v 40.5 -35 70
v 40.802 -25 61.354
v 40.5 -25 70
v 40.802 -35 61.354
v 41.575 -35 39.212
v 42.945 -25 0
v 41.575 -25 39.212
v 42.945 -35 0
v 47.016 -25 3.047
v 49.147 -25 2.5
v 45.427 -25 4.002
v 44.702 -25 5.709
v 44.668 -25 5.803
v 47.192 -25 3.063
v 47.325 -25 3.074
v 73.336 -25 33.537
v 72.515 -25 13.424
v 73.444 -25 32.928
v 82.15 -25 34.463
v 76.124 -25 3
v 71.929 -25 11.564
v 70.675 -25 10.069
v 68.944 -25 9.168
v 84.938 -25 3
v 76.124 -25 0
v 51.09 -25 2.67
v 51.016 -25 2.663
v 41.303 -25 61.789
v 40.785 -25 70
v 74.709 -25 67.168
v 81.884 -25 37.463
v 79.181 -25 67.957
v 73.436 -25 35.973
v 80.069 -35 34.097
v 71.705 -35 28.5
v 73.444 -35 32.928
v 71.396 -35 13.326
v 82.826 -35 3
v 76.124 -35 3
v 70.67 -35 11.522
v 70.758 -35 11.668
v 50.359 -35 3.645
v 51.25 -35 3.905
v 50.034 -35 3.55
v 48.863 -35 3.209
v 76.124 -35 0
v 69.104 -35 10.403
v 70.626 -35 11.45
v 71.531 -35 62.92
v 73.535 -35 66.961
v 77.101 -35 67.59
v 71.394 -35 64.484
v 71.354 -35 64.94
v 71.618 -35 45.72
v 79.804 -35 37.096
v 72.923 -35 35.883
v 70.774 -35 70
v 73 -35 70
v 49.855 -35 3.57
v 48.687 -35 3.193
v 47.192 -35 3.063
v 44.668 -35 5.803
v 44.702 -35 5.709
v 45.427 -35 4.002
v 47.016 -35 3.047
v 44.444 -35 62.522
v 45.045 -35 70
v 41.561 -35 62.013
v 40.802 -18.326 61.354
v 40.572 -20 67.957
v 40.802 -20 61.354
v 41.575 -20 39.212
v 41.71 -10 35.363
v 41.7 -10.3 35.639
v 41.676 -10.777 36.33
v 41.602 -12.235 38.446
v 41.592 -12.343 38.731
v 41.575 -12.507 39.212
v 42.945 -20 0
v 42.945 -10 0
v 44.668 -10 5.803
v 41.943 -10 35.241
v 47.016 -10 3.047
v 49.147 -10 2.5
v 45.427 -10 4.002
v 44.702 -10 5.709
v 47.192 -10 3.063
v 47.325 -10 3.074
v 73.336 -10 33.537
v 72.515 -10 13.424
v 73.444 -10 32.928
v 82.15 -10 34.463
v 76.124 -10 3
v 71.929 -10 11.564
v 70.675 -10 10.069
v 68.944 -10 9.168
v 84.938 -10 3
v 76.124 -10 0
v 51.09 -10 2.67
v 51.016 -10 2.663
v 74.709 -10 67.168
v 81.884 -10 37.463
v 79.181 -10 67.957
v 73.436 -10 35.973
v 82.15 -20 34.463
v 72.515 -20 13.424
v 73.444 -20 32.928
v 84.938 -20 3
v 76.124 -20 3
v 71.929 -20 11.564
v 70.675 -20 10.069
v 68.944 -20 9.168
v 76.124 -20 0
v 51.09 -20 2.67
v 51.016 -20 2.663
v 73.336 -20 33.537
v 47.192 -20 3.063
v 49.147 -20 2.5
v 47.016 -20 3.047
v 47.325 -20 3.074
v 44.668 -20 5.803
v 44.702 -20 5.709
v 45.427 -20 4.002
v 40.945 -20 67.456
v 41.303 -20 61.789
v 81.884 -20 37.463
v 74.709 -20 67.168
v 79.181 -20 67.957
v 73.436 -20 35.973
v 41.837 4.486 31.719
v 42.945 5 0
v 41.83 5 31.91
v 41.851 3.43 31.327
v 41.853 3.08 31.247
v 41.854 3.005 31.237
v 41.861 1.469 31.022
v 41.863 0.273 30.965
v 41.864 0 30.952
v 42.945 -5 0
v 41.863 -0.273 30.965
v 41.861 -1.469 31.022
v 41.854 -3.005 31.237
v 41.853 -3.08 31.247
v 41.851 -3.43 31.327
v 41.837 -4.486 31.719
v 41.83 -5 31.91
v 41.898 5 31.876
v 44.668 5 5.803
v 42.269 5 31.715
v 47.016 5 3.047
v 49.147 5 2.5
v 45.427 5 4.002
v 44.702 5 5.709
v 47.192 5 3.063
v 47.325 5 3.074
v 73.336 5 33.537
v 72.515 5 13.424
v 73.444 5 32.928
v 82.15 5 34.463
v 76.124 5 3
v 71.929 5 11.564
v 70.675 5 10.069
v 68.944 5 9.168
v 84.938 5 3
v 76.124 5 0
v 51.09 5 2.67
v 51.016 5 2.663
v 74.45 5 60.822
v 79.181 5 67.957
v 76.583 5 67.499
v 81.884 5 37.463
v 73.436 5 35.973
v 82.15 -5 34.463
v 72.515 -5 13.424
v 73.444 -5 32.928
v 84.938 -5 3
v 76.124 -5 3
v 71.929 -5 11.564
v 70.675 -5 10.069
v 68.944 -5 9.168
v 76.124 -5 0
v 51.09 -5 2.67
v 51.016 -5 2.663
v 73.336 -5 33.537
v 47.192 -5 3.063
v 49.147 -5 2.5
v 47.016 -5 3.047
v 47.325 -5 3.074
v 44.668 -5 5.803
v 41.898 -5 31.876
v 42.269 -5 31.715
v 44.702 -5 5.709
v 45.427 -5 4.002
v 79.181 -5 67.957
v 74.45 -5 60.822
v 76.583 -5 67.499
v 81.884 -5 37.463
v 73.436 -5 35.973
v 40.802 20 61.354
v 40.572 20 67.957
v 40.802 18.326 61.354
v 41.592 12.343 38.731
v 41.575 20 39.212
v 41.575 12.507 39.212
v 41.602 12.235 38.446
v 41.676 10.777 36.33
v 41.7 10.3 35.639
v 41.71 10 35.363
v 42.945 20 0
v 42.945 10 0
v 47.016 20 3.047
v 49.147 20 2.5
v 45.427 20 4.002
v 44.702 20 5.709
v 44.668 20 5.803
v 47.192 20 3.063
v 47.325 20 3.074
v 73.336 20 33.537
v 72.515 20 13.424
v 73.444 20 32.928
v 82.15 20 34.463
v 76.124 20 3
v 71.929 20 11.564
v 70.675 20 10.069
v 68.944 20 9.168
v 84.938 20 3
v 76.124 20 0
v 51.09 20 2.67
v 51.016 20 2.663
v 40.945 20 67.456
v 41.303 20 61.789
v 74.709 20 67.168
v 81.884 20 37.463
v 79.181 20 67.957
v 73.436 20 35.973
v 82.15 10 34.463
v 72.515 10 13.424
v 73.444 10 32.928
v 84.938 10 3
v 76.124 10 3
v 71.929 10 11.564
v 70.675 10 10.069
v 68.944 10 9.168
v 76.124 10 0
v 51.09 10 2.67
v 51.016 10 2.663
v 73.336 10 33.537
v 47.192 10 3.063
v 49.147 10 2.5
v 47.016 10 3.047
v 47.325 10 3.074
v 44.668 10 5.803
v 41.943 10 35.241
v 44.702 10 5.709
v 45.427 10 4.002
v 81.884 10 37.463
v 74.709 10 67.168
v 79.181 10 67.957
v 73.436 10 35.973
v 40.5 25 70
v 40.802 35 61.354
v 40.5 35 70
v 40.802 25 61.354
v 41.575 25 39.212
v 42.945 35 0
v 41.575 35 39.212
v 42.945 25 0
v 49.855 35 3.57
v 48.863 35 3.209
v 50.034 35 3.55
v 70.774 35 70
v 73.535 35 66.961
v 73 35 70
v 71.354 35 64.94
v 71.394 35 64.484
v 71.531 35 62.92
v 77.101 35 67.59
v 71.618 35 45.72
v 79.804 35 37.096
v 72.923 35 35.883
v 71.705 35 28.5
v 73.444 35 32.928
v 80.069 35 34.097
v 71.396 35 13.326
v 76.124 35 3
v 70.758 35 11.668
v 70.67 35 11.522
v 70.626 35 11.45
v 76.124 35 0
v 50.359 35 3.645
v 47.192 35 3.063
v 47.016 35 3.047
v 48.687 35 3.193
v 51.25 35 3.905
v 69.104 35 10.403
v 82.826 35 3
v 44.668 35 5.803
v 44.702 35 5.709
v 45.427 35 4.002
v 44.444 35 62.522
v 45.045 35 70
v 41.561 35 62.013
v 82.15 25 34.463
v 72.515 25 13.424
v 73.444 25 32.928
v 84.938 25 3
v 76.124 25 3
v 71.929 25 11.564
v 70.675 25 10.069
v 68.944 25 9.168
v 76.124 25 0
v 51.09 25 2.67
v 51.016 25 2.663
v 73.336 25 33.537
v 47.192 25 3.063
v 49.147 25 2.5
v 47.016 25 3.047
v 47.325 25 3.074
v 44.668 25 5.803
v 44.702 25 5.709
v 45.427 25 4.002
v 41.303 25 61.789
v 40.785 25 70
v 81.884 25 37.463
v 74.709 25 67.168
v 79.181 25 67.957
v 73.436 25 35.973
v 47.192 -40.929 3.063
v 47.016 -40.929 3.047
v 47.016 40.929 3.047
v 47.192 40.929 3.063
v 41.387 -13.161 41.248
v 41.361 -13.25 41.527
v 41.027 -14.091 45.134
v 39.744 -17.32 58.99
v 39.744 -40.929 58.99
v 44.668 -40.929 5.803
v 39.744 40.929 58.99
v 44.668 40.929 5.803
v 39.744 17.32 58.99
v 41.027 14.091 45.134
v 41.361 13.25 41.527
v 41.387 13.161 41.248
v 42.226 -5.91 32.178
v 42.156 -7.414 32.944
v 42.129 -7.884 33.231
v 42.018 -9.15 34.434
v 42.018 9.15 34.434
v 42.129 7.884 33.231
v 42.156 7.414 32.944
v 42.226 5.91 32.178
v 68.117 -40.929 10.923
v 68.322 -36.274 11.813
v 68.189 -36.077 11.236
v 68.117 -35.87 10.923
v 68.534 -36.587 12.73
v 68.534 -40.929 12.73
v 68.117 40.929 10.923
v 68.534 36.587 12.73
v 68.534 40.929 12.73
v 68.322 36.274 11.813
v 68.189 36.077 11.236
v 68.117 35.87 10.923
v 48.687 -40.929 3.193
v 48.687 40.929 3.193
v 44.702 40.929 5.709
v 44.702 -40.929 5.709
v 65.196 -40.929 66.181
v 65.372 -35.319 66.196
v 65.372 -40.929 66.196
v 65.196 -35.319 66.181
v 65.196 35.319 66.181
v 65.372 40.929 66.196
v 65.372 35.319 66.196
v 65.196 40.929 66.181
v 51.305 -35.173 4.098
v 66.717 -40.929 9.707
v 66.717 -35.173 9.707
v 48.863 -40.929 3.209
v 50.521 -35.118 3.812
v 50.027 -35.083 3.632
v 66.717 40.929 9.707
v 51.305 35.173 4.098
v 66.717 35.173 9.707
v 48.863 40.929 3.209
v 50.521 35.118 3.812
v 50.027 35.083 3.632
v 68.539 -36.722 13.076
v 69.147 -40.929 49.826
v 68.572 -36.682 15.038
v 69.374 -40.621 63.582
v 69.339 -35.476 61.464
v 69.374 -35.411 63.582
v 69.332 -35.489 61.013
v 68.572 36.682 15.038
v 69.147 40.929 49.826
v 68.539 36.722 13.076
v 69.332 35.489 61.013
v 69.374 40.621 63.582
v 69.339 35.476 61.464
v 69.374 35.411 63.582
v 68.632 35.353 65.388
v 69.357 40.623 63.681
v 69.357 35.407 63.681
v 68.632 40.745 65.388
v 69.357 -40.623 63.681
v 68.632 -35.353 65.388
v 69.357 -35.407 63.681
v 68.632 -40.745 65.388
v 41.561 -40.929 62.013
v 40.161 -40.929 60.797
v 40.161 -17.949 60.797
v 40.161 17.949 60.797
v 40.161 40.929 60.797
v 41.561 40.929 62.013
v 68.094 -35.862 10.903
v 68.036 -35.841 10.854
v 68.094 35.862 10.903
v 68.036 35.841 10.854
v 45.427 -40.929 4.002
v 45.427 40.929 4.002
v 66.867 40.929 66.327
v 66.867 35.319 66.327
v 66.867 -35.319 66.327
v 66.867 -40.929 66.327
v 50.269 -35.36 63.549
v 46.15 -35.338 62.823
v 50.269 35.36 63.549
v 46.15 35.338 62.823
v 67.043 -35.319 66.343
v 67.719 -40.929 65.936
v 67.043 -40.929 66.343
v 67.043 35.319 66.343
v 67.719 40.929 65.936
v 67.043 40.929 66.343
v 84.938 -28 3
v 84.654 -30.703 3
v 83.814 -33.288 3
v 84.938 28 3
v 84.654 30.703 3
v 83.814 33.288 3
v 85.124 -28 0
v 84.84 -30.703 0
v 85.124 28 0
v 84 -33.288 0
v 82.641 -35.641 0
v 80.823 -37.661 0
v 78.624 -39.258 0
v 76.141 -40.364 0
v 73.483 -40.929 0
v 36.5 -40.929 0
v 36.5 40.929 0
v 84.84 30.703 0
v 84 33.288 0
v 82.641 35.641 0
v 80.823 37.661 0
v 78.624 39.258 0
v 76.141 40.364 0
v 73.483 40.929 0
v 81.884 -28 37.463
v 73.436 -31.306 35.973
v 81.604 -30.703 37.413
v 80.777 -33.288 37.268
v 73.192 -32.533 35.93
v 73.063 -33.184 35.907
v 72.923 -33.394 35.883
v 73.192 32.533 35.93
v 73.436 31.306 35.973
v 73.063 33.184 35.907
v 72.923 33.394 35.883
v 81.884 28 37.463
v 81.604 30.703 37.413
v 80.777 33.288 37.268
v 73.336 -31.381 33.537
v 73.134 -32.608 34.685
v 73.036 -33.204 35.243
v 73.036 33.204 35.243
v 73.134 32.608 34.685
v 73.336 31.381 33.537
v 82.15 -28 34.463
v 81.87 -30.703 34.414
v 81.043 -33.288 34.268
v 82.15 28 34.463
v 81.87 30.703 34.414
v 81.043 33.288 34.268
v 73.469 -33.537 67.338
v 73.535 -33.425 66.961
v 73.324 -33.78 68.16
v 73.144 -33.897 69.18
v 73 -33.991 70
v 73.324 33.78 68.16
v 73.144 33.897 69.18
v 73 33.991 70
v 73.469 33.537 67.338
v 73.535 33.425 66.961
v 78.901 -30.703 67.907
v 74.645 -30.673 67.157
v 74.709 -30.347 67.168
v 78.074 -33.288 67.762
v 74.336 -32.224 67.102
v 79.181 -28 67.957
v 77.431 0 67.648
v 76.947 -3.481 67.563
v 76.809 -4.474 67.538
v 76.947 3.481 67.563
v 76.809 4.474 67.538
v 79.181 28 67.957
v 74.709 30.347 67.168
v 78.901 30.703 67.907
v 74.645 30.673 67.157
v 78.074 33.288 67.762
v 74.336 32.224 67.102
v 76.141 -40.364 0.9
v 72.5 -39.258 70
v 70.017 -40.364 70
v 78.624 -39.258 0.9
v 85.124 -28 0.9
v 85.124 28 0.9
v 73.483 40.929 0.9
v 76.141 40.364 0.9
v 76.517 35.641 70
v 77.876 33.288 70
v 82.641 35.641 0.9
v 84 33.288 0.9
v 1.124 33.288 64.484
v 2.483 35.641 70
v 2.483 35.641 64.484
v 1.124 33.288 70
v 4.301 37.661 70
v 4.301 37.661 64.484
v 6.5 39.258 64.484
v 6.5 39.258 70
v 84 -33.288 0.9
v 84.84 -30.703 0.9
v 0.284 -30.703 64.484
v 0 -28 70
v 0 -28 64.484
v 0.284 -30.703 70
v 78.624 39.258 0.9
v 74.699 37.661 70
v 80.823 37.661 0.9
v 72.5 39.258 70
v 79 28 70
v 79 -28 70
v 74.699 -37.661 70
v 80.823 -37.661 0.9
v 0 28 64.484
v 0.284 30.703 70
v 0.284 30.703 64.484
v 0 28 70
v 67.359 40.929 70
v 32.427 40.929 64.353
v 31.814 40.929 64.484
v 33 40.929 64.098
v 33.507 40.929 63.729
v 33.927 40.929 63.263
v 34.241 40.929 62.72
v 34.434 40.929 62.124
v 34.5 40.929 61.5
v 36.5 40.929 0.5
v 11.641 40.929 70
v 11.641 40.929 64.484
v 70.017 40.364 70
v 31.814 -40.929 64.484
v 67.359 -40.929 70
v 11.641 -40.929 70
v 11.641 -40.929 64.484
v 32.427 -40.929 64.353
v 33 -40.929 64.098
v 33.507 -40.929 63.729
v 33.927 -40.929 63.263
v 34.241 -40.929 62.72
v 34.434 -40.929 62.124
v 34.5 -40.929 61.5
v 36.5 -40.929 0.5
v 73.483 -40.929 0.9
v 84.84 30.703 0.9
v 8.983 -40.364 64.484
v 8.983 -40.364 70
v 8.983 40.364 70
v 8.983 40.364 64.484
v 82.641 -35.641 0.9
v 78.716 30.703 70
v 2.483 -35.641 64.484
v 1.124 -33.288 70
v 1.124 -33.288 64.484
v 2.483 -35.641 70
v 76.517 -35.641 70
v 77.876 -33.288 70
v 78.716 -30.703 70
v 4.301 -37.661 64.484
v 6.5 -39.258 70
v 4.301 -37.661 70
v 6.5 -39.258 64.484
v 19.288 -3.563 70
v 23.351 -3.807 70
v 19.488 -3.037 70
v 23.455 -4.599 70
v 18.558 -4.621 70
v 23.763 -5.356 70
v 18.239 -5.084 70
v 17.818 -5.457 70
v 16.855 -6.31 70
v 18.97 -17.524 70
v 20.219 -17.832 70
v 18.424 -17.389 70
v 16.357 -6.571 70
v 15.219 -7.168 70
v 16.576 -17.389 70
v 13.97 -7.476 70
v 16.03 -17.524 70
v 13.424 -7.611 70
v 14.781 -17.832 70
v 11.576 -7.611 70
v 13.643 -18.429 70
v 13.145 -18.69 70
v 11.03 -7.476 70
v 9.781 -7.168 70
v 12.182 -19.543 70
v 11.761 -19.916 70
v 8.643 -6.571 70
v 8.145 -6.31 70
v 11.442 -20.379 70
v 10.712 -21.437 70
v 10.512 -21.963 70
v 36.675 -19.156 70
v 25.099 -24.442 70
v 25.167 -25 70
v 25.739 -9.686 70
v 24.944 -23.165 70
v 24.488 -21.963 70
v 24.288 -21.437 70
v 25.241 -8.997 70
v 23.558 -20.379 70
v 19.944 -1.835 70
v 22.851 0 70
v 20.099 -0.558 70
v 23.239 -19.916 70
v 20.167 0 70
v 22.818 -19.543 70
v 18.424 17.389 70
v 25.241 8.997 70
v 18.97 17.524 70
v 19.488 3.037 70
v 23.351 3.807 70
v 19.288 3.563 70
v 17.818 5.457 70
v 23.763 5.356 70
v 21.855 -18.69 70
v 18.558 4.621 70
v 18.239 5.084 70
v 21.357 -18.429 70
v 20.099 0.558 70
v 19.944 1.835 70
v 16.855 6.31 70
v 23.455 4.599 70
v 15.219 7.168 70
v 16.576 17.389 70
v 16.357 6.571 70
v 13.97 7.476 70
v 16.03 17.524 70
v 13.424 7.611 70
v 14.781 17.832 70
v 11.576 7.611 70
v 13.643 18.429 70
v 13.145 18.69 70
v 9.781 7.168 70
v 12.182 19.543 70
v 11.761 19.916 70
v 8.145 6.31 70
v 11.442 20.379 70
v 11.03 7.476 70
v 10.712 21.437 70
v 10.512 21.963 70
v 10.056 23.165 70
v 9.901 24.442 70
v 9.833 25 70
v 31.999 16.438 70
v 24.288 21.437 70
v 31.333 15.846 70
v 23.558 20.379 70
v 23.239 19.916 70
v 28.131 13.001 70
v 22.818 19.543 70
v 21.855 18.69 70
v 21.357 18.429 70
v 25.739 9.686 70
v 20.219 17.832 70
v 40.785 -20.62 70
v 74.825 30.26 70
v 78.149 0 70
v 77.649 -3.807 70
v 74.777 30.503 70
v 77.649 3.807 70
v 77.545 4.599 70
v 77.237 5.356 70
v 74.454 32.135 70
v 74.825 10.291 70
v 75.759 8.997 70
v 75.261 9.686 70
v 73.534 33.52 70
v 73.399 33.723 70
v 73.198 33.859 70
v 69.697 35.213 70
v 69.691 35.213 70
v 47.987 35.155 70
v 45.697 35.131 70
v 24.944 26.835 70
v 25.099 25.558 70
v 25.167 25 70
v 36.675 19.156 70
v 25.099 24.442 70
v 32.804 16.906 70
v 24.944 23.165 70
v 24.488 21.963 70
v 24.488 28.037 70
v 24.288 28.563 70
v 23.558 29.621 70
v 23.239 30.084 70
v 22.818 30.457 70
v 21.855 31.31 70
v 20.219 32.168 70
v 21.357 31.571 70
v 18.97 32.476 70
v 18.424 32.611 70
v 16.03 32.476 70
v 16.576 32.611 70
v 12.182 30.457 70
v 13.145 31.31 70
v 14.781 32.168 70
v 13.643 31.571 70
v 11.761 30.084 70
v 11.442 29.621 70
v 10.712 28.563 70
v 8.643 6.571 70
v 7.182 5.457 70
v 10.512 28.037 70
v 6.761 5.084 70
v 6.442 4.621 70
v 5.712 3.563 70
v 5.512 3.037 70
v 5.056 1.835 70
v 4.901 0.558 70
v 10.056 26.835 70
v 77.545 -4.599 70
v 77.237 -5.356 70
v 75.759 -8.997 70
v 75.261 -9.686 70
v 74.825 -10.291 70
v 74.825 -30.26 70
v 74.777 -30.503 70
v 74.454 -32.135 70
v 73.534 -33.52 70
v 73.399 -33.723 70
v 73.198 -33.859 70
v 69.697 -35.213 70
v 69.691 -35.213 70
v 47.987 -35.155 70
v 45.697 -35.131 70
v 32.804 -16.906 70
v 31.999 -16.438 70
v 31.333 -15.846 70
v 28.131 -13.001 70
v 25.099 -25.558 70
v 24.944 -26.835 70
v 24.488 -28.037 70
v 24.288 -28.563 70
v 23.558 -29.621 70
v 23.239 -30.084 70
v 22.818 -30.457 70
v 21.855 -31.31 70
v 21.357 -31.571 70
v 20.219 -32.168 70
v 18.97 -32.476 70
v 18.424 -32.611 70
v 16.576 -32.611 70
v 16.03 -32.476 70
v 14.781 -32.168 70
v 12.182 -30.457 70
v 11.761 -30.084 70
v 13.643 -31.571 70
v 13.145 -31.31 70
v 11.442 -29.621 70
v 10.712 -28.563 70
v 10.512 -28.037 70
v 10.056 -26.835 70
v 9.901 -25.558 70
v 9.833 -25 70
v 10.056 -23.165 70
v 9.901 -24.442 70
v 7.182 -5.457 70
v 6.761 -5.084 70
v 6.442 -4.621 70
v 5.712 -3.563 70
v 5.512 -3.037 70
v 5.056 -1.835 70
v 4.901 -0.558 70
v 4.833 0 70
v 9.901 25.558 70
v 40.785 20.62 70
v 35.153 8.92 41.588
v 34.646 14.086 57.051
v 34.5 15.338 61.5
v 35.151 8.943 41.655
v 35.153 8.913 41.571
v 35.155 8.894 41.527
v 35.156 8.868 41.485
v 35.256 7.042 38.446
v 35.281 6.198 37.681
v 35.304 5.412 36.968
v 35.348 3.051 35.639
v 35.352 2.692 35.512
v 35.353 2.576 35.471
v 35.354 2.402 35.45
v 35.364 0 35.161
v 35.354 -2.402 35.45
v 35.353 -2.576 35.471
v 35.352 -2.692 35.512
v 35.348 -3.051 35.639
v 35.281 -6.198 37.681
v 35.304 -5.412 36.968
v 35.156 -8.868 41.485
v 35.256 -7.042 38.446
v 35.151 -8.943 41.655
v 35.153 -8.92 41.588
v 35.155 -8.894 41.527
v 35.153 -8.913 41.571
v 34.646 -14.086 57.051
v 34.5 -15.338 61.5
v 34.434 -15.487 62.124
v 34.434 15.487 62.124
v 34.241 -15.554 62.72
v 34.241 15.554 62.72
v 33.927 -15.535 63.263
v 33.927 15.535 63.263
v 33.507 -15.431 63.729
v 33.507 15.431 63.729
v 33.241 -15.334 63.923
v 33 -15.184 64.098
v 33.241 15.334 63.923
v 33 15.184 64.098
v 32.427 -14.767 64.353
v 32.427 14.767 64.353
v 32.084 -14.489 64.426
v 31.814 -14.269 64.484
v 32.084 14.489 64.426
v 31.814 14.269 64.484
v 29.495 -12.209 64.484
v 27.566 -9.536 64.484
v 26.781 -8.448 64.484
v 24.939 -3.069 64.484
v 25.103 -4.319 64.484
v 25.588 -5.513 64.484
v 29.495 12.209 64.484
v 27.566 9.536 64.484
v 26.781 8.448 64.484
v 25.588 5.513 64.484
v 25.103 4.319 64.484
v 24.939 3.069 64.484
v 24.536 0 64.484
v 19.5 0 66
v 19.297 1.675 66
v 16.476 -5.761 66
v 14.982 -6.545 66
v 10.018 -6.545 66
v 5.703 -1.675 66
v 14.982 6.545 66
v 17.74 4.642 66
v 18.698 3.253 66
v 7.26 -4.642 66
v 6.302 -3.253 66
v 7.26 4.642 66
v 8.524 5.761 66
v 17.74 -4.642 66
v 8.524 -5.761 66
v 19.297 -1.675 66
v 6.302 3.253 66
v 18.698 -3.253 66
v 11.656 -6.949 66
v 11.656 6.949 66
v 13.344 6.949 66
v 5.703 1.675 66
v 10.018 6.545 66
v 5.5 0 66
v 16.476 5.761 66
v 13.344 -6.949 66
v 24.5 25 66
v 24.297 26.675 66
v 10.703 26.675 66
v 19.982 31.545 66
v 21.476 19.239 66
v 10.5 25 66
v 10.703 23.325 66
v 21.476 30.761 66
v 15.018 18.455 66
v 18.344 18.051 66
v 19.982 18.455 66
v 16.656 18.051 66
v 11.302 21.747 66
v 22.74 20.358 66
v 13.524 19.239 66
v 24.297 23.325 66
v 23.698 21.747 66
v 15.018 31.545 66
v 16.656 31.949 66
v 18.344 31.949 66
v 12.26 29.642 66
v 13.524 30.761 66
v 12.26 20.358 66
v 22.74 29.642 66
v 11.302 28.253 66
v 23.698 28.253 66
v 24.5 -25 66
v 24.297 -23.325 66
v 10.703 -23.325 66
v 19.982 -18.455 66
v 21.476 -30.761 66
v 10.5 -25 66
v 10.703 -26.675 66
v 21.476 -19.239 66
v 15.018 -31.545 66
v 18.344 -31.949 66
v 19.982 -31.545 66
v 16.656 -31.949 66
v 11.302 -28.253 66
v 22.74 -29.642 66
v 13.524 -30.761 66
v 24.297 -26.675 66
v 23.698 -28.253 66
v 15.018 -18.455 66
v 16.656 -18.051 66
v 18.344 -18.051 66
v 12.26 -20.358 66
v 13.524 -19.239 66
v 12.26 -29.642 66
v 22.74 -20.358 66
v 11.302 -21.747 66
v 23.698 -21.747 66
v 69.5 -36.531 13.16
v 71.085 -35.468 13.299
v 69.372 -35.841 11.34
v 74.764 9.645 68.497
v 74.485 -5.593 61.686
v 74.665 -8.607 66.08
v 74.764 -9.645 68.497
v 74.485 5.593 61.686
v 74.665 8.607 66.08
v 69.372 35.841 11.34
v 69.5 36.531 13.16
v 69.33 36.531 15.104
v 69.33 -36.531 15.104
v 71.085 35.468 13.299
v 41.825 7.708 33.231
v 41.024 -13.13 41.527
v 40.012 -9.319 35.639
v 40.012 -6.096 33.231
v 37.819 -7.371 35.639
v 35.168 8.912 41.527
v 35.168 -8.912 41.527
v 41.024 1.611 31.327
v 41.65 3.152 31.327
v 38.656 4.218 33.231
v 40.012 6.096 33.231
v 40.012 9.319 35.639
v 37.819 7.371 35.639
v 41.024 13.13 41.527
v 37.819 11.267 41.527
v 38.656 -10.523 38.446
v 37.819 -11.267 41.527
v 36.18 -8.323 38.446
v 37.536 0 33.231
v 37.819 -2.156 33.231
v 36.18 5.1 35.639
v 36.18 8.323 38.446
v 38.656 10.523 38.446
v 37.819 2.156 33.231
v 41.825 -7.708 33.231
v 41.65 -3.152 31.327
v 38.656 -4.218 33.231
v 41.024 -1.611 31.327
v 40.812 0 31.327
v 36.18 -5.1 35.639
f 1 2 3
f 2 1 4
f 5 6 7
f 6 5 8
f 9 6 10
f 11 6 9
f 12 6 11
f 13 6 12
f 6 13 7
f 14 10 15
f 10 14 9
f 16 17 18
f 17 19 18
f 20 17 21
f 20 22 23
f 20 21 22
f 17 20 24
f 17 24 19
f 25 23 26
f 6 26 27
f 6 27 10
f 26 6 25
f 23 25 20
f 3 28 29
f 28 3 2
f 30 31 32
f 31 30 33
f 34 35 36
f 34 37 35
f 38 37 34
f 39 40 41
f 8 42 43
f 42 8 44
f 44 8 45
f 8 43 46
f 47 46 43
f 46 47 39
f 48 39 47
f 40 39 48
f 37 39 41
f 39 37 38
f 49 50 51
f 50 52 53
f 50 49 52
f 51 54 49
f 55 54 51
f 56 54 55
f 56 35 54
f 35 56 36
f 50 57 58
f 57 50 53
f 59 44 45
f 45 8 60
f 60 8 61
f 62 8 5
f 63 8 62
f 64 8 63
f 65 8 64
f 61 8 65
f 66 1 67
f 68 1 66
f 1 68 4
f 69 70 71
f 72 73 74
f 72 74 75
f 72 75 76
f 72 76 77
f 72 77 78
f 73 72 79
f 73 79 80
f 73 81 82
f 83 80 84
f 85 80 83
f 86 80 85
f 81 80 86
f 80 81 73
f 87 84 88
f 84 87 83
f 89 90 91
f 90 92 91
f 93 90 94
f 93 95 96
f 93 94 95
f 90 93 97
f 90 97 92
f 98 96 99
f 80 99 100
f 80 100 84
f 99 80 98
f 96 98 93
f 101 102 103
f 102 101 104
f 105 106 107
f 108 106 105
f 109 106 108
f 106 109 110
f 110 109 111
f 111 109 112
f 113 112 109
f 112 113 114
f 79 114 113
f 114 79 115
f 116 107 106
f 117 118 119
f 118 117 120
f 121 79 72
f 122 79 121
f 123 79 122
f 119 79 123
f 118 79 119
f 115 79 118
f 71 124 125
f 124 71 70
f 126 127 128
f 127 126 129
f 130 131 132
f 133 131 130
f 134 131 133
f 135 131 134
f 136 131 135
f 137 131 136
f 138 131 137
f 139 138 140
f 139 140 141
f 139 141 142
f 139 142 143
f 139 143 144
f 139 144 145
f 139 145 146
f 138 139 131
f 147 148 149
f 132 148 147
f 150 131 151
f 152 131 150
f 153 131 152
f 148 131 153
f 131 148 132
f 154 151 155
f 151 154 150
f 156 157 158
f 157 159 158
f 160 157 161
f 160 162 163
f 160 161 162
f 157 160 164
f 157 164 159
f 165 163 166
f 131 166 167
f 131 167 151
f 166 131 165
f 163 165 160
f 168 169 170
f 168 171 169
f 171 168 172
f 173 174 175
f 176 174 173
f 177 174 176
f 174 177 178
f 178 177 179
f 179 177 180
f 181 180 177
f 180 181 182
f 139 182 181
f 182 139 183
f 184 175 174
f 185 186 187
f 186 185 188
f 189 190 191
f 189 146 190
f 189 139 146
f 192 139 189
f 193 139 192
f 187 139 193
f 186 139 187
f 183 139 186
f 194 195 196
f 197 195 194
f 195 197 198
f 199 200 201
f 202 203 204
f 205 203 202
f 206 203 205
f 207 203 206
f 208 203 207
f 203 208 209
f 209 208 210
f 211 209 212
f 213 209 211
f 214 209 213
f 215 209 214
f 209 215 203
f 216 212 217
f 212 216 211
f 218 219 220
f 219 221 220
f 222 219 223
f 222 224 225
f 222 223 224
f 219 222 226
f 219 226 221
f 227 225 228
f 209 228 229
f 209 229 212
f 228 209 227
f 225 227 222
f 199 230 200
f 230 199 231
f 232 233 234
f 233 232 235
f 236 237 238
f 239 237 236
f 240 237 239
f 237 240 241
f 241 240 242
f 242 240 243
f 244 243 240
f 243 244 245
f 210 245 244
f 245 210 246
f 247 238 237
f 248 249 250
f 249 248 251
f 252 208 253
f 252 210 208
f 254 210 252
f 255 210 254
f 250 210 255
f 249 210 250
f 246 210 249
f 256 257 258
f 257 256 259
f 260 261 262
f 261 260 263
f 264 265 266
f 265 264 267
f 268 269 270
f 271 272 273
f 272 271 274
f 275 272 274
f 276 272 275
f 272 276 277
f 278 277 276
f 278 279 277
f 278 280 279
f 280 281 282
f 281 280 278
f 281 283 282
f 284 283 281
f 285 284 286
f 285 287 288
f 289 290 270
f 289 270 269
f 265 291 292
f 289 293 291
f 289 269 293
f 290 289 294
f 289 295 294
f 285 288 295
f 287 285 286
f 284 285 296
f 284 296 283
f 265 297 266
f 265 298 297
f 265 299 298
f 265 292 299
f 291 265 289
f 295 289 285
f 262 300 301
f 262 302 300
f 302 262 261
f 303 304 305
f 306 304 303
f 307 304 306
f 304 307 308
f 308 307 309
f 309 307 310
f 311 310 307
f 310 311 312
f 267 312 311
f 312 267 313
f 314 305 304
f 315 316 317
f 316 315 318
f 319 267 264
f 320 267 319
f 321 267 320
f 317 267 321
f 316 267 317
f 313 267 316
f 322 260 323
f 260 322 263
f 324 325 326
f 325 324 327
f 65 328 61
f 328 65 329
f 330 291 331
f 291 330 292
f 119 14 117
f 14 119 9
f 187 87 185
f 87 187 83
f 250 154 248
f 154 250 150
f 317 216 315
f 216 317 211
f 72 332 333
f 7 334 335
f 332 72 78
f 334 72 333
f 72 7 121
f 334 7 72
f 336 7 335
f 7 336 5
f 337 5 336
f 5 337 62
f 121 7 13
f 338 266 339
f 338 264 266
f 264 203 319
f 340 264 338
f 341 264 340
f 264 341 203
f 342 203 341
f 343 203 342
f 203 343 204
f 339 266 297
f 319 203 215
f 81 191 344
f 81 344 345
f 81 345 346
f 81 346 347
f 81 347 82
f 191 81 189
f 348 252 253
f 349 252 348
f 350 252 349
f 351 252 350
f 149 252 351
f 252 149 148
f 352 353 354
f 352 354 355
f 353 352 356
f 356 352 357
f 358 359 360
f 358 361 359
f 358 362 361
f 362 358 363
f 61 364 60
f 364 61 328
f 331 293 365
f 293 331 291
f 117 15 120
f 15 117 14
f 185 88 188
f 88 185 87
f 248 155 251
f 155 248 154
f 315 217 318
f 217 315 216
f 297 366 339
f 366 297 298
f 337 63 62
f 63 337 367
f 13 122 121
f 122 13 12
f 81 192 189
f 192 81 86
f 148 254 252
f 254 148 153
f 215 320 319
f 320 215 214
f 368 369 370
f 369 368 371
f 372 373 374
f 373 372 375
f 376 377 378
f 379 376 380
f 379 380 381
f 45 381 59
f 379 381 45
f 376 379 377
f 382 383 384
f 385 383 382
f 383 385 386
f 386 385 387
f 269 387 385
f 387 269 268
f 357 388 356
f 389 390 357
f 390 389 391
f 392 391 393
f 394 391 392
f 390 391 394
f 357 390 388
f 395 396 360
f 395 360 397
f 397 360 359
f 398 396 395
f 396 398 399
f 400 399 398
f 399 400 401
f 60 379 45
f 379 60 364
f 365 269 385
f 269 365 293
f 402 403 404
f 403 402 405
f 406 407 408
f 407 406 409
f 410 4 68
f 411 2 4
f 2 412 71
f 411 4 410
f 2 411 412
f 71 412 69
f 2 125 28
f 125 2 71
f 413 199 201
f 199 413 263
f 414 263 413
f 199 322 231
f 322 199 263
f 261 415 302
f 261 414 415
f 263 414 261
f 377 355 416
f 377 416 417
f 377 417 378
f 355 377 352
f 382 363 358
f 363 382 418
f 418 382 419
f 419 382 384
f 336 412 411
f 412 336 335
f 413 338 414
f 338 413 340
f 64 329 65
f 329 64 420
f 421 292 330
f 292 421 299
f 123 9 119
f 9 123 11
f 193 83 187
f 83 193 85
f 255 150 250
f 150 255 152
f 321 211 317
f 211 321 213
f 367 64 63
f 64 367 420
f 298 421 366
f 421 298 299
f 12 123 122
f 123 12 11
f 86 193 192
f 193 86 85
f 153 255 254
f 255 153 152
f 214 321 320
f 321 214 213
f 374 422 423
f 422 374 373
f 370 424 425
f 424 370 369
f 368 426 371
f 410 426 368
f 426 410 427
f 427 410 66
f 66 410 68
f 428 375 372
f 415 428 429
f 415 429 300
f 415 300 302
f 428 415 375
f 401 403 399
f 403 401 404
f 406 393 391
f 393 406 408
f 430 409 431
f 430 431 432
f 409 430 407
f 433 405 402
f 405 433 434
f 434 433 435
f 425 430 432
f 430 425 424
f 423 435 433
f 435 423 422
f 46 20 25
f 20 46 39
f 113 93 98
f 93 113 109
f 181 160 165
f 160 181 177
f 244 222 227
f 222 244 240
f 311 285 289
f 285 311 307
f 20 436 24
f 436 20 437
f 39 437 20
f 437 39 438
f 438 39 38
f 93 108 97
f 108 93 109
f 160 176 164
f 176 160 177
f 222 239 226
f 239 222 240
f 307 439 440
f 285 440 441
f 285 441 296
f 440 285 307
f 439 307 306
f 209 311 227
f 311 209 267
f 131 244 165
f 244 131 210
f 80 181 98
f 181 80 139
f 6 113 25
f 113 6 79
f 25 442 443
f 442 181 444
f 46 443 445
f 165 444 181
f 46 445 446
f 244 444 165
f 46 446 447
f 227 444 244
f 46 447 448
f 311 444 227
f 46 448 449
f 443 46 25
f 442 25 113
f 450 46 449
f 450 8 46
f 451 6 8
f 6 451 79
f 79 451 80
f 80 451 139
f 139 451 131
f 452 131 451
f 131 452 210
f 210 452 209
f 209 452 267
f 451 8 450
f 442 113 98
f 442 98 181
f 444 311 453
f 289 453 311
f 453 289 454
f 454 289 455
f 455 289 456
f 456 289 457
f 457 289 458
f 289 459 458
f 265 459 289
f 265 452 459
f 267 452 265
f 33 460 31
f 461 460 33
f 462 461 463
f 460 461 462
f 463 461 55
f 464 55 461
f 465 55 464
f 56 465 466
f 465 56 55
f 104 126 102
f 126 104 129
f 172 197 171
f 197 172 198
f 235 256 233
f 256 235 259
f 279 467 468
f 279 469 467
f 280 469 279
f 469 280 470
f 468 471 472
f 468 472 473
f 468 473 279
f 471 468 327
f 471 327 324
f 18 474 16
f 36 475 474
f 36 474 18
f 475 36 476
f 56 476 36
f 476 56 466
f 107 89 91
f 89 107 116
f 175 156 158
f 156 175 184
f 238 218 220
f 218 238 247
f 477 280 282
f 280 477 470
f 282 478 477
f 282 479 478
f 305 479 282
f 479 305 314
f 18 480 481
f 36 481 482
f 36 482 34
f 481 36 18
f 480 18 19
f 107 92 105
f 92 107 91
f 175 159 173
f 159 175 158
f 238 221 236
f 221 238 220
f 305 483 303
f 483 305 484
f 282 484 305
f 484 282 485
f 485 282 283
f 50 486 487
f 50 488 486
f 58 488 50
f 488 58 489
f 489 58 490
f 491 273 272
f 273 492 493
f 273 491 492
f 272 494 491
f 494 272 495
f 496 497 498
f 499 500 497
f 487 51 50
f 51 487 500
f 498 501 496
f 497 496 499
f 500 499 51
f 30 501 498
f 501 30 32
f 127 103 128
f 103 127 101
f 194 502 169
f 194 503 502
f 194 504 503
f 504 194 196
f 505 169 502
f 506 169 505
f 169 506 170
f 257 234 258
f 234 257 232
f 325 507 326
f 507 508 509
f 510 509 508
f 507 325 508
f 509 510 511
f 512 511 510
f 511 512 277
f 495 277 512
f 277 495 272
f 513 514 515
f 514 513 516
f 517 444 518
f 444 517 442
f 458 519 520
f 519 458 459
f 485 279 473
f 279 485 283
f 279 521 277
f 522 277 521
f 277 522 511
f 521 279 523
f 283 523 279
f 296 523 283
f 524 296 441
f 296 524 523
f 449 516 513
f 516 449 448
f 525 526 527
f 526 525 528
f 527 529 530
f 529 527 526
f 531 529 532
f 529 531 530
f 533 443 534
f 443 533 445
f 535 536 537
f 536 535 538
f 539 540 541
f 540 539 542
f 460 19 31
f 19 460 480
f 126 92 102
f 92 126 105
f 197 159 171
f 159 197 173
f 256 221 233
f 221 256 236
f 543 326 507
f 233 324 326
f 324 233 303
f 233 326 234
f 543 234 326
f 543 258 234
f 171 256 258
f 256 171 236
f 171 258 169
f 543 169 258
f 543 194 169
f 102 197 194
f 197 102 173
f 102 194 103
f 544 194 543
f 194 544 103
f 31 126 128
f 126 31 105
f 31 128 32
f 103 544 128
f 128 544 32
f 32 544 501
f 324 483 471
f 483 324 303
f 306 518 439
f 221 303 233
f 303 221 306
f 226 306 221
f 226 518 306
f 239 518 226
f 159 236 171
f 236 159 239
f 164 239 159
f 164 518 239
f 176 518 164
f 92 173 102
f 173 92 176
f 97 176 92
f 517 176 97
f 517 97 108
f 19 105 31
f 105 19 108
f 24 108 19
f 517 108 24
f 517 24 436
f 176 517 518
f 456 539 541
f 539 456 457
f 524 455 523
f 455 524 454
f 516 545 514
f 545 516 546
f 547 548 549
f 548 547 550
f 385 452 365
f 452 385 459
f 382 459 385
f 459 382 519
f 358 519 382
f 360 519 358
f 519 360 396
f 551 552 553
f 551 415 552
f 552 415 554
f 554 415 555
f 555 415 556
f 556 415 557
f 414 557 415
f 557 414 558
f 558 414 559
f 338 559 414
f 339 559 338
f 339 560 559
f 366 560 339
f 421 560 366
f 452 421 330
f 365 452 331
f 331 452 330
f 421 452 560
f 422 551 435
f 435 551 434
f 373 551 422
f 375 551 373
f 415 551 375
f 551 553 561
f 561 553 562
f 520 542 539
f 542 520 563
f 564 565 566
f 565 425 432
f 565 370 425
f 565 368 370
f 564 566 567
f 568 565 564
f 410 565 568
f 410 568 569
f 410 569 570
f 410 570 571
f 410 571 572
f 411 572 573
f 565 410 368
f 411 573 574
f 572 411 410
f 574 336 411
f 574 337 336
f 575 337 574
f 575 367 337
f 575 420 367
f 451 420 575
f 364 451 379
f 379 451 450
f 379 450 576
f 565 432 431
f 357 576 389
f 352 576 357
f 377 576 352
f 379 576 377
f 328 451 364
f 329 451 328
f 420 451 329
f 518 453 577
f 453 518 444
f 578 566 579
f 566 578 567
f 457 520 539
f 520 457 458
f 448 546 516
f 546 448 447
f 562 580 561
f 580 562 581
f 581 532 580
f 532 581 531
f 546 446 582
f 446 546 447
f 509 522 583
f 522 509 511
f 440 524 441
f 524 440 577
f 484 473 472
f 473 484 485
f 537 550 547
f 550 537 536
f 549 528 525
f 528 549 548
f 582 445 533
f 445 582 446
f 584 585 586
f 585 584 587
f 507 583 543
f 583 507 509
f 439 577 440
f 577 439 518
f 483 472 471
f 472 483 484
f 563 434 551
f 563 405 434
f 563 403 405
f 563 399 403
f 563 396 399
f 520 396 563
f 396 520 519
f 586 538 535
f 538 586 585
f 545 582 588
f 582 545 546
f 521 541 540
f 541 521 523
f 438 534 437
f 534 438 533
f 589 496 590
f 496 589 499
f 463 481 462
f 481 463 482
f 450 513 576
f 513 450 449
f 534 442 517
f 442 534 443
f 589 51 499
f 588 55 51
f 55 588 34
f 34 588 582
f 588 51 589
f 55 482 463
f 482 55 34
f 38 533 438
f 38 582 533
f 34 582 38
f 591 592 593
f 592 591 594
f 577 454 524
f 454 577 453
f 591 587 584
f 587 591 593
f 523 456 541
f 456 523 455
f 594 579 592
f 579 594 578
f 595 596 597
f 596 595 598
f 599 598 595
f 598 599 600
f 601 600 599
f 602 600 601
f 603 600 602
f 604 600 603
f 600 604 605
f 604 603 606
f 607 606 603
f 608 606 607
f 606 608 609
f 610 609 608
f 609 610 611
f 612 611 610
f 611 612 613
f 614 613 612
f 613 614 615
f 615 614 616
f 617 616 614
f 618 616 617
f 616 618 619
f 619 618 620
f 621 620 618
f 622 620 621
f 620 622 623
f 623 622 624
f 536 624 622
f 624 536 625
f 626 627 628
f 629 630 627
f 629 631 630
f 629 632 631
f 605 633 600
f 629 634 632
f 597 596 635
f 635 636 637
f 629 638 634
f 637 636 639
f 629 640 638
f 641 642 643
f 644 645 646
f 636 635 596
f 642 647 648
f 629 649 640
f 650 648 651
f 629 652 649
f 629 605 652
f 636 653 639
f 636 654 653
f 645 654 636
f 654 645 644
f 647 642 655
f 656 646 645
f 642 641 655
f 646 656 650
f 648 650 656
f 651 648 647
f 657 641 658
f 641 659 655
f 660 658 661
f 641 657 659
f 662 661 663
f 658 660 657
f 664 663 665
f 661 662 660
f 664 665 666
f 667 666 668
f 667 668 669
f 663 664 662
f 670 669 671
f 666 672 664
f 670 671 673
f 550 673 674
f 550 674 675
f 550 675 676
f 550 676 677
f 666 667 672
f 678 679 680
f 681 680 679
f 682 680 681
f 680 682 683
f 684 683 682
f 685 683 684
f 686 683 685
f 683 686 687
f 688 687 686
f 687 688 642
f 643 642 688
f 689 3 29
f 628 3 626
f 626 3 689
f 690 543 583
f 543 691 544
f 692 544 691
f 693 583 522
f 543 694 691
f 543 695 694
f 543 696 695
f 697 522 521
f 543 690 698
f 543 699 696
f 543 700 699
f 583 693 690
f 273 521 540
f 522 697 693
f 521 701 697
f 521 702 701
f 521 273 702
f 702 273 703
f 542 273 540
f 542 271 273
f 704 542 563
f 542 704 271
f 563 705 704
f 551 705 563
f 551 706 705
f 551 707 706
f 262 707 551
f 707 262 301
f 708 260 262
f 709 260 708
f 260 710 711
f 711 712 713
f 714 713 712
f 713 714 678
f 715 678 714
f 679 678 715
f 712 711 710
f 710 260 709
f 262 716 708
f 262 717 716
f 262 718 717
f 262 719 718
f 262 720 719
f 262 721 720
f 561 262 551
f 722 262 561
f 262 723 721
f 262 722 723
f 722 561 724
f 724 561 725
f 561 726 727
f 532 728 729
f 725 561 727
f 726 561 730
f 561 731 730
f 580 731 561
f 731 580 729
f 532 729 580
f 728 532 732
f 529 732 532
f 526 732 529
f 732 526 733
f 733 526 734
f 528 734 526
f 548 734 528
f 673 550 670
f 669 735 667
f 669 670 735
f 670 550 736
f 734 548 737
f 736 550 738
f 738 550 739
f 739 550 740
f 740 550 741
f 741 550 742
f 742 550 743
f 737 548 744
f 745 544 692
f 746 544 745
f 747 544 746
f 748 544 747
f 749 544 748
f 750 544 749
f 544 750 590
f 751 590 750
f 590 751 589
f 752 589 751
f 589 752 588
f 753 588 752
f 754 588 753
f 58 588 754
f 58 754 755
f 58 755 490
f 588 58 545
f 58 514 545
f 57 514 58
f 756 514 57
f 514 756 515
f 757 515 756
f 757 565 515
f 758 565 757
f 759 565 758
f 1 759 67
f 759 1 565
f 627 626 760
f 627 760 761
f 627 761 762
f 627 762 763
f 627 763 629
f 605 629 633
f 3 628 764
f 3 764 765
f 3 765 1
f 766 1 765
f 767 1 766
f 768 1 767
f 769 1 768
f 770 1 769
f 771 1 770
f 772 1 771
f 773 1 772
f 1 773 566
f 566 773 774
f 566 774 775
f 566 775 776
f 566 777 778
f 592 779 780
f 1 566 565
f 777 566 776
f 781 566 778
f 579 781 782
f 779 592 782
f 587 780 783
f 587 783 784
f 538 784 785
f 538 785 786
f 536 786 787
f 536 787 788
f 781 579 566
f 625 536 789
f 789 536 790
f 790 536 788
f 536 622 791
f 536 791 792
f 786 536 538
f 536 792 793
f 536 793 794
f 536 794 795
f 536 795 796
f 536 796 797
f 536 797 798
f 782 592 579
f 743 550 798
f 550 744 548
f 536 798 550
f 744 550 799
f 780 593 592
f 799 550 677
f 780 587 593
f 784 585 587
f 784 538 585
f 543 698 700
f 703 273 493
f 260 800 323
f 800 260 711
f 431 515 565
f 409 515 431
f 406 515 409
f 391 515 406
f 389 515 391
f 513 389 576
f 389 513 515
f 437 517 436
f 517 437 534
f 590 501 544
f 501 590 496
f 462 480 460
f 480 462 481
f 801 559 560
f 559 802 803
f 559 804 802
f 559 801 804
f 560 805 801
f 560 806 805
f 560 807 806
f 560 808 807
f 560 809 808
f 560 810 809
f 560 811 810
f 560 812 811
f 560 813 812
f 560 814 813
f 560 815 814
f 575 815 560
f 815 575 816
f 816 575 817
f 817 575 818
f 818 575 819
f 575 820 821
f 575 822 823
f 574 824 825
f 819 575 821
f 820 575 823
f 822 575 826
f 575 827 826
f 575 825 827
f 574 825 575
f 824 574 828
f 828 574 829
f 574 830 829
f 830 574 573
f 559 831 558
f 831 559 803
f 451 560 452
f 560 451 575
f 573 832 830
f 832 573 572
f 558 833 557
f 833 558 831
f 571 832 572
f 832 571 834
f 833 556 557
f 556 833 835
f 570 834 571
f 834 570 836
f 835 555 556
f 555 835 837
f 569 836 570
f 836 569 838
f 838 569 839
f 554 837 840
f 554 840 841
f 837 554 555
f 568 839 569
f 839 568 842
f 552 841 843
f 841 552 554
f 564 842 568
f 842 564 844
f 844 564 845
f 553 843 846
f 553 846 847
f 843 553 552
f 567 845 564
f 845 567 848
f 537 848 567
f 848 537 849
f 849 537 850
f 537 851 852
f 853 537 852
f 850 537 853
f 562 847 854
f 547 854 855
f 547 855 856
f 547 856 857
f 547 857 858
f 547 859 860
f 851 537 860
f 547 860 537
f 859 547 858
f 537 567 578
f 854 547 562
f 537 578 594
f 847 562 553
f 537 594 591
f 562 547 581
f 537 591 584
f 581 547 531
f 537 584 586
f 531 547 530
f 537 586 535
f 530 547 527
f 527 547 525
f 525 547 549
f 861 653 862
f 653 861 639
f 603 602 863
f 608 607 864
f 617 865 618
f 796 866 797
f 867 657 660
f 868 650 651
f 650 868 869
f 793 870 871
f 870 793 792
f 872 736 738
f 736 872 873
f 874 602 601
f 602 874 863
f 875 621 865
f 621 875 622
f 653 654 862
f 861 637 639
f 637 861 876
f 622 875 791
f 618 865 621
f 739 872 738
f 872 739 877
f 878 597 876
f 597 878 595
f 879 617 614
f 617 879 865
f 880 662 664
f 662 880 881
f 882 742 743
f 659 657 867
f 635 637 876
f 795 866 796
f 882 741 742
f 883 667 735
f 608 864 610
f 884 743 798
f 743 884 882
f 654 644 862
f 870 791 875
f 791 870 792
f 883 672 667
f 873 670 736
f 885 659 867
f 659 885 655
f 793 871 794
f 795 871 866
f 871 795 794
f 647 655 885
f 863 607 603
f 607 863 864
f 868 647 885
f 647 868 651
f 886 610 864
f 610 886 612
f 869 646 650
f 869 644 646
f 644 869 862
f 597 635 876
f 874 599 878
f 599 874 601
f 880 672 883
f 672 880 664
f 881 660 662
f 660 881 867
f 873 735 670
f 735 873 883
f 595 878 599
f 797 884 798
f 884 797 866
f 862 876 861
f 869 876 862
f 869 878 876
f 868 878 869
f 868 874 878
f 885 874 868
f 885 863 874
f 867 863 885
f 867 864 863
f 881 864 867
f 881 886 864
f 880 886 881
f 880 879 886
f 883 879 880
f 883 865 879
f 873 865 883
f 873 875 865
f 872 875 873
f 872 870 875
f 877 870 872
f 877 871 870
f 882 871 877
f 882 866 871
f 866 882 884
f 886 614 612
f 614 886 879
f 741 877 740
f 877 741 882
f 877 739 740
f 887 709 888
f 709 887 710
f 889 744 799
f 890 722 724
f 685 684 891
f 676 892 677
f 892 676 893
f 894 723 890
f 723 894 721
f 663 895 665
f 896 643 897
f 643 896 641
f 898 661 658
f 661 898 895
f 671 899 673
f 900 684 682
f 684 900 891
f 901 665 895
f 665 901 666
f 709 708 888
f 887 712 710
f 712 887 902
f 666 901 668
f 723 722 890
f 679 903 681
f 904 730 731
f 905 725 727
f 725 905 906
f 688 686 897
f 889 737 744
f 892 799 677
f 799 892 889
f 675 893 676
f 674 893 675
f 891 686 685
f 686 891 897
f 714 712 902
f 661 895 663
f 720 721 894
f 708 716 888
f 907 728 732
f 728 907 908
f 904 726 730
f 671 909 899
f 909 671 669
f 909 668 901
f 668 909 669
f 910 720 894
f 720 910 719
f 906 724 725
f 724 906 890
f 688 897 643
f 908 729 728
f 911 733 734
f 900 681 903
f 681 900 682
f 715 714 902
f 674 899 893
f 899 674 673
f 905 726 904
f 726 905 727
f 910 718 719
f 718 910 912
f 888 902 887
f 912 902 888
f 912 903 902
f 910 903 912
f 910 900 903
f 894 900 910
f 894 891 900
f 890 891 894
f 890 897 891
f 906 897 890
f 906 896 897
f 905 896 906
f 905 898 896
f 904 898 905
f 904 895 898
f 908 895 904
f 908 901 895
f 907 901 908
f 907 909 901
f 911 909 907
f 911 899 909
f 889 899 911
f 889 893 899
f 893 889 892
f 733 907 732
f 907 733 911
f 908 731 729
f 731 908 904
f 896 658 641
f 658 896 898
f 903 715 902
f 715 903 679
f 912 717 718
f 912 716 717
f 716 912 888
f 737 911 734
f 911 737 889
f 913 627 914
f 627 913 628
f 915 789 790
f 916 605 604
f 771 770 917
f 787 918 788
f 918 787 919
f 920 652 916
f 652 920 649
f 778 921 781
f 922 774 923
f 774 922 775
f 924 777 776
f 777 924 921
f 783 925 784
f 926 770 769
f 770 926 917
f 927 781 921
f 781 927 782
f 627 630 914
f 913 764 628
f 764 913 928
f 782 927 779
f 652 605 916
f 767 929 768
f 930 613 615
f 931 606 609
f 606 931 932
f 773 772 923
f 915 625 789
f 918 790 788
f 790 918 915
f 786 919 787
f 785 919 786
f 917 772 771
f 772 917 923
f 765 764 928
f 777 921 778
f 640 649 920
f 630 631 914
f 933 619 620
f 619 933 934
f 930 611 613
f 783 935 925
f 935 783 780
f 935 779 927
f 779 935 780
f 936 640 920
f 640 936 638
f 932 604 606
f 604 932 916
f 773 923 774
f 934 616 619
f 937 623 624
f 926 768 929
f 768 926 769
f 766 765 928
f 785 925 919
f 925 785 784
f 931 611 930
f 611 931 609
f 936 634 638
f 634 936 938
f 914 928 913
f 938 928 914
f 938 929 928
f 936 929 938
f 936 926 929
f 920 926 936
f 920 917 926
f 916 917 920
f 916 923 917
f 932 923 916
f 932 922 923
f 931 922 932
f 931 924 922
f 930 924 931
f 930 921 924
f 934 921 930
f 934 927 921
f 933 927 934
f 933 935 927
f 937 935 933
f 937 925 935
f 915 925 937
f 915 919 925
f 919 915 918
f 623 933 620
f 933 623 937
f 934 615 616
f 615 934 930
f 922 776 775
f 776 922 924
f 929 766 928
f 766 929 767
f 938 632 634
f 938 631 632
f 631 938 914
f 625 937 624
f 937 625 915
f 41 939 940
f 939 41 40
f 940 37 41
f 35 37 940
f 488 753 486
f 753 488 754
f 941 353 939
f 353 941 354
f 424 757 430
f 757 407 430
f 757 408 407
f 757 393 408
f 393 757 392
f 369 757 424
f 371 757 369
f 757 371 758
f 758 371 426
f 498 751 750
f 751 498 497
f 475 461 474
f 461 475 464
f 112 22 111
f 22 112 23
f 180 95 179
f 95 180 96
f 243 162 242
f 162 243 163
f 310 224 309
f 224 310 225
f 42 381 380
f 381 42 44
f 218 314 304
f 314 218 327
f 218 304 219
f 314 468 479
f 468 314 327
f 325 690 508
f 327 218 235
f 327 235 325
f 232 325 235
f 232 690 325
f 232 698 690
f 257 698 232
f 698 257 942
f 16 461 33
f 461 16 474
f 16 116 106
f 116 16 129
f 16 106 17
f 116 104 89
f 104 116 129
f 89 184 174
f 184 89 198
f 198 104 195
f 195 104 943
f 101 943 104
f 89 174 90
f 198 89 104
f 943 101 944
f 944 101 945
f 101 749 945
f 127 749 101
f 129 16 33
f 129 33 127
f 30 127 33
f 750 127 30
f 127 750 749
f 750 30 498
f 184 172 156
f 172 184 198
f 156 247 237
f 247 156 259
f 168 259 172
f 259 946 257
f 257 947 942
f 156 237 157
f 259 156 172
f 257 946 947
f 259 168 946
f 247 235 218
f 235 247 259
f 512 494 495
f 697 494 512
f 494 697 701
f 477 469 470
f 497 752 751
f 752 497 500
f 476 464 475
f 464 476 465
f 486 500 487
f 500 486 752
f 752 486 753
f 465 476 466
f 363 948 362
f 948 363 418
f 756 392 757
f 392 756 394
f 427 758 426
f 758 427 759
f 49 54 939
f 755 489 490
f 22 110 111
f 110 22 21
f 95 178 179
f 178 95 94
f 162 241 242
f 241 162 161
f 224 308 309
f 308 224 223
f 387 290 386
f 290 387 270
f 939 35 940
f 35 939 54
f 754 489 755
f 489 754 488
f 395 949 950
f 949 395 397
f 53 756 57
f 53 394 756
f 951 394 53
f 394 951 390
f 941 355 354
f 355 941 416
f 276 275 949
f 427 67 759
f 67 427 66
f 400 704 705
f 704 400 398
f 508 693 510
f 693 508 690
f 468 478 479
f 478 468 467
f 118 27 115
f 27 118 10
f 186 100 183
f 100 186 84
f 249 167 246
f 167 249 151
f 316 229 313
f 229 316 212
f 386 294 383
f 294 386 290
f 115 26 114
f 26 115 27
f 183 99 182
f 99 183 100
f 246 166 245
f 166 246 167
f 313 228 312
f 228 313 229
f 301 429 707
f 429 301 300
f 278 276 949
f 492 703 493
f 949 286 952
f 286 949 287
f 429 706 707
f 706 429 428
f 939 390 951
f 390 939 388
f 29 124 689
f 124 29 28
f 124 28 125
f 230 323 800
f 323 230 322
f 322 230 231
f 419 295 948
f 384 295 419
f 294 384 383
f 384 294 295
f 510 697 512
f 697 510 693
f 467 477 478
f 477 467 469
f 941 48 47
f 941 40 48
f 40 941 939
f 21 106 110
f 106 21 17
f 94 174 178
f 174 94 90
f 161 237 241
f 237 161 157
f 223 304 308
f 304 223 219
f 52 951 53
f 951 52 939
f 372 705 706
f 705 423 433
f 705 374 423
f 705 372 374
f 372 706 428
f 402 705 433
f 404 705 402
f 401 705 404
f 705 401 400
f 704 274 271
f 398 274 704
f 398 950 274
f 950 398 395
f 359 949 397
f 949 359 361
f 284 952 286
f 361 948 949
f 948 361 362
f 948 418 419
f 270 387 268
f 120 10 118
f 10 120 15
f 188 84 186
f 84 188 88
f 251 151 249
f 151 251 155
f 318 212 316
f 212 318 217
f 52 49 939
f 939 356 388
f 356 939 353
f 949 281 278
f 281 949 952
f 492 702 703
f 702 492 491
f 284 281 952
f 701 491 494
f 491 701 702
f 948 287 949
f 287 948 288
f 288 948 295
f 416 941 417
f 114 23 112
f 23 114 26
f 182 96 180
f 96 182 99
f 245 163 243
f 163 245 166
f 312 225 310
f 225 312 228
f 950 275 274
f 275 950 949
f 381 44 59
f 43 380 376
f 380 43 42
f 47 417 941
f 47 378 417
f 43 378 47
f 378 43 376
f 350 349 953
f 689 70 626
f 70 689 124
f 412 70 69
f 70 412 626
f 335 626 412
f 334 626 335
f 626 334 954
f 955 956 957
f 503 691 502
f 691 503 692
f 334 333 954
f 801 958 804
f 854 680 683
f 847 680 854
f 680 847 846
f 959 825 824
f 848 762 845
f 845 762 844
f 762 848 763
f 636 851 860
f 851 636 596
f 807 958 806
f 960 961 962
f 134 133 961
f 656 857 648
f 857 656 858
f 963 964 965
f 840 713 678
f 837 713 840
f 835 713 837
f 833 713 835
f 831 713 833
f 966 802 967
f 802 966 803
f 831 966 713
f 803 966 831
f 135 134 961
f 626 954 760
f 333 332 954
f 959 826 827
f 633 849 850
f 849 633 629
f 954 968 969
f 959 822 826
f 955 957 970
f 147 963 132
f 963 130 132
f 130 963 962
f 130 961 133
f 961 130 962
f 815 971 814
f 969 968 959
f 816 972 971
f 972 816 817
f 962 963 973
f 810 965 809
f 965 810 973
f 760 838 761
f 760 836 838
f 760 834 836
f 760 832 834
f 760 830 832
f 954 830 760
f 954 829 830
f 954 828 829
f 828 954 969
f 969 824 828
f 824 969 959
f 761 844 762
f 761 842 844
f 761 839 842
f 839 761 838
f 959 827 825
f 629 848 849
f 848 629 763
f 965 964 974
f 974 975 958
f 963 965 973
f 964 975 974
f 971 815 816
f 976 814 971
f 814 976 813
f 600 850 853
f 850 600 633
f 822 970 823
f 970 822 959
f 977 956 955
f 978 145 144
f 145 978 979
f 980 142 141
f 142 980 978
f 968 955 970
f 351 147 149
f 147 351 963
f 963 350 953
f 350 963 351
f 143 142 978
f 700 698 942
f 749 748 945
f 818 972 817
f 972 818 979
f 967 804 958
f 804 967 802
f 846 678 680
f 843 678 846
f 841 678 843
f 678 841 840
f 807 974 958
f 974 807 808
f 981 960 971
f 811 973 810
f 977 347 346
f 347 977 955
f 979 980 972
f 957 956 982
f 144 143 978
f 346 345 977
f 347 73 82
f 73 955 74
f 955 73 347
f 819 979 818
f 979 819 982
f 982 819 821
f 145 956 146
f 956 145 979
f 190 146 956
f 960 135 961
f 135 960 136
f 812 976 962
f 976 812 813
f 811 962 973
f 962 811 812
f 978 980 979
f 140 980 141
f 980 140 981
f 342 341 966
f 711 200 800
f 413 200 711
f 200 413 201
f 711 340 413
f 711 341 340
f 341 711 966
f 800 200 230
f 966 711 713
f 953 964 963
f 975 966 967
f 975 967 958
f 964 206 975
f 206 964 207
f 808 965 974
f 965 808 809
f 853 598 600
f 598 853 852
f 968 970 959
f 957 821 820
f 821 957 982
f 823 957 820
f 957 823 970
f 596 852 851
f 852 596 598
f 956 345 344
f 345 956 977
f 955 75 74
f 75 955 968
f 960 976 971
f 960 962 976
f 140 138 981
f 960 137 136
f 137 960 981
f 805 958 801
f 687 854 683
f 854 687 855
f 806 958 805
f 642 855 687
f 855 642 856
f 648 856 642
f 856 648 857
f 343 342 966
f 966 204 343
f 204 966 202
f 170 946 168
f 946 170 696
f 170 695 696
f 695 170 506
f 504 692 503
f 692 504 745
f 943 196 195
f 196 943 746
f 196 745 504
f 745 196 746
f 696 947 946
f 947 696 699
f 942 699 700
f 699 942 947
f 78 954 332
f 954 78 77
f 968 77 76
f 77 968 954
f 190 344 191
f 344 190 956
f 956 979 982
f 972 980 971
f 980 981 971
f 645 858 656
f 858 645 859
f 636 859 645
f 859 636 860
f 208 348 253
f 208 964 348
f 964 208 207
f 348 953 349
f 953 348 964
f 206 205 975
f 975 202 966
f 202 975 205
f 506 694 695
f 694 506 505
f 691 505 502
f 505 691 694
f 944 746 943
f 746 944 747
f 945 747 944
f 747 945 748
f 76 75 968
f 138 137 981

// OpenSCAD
wall=3;

top_w = 33;
bot_w = 40;

sponge_depth = 70;

depth = sponge_depth+wall*2;
height = 70;

sponge_thick = 25;
handles_thick = 25;

angle = 15;
flare = 10;

top_width = wall*4 + top_w+sponge_thick+handles_thick+flare*2;

bot_width = wall*4 + bot_w + sponge_thick + handles_thick + tan(angle)*height*2;

//sponge_holder();

sponge_holder_single(angle=5, handle=true);

//hangle sponge, with tab for magnetic attachment.
module sponge_holder_single(handle = false){
    top_width = wall*2 + top_w+handles_thick+flare*2-5;
    bot_width = top_width+height*tan(angle);
    
    mag_rad = 10;
    
    difference(){
        union(){
            translate([0,-depth/2,0]) hull(){
                translate([mag_rad+wall,mag_rad,0]) minkowski(){
                    cube([bot_width-mag_rad*2-wall*2, depth-mag_rad*2, .8]);
                    cylinder(r=mag_rad+wall, h=.1);
                }
                
                translate([mag_rad+wall,mag_rad,height-1]) minkowski(){
                    translate([0,0,.1]) cube([top_width-mag_rad*2-wall*2, depth-mag_rad*2, .8]);
                    cylinder(r=mag_rad+wall, h=.1);
                }
            }
        }
        
        //sink hollow
        translate([top_w/2,0,0]) hull(){
            cube([bot_w, depth+10, 1], center=true);
            translate([-wall/2,0,height-wall-wall-wall]) minkowski(){
                cube([top_w, depth+10, 1], center=true);
                sphere(r=wall, $fn=30);
            }
        }
        
        //mag pits
        translate([12.5,0,height-wall*2+2]) cylinder(r1=7, r2=8, h=wall*2);
        translate([17.5,25,height-wall*2+2]) cylinder(r1=7, r2=8, h=wall*2);
        translate([17.5,-25,height-wall*2+2]) cylinder(r1=7, r2=8, h=wall*2);
        
        //sponge/handle slot
        translate([top_w+sponge_thick/2+flare/2+2,0,height+wall*2.5+wall]) rotate([0,-angle,0]) translate([0,0,-height]) minkowski(){
            hull(){
                rotate([0,-15,0]) cube([handles_thick-wall*2, sponge_depth-wall*2, .1],center=true);
                translate([flare/2,0,height-wall]) cube([sponge_thick-wall*2-4+flare, sponge_depth-wall*2-4, .1],center=true);
            }
            sphere(r=wall+2);
        }
        
        //handle clearance
        translate([top_w+sponge_thick/2+flare/2,0,25/2*1.5+wall+23]) 
        scale([1.25,1,1]) hull(){
            sphere(r=handles_thick/2+wall);
            translate([0,0,40]) sphere(r=handles_thick);
        }
        
        //drainage
        for(i=[1]) mirror([i,0,0])
        difference(){
            union(){
            translate([-bot_width-bot_w-wall,-depth/2+wall,-.1]) rotate([0,2,0]) 
            for(i=[0:4]){
                translate([0,i*15,0]) cube([bot_width,10,height*2]);
            }
            
            //front and back holes
            translate([-top_w-sponge_thick/2-flare/2,0,height+wall*3]) rotate([0,angle,0]) translate([0,0,-height]) minkowski(){
            hull(){
                rotate([0,15,0]) cube([sponge_thick-wall*2, sponge_depth+wall*6, .1],center=true);
                translate([-flare/4,0,height-wall*6]) rotate([0,5,0]) cube([sponge_thick-wall*2+flare/2, sponge_depth+wall*6, .1],center=true);
            }
            sphere(r=wall);
        }
        }
            
            //base stiffener
            translate([-bot_width+wall,0,wall/2]) cube([wall*4, depth, wall], center=true);
            //mid stiffener
            translate([-bot_width-wall,0,wall/2]) rotate([0,10,0]) translate([0,0,height/2]) cube([wall*6, depth, wall], center=true);
            //top stiffener
            translate([-bot_width-wall,0,wall/2]) rotate([0,10,0]) translate([0,0,height]) cube([wall*2, depth, wall*2], center=true);
        }
        
    }
}

//normal sponge on one side, handle sponge on the other.
module sponge_holder(){
    difference(){
        union(){
            hull(){
                translate([0,0,.5]) cube([bot_width, depth, 1], center=true);
                translate([0,0,height-.5]) cube([top_width, depth, 1], center=true);
            }
        }
        
        //sink hollow
        hull(){
            cube([bot_w, depth+1, 1], center=true);
            translate([0,0,height-wall-wall]) minkowski(){
                cube([top_w, depth+1, 1], center=true);
                sphere(r=wall/2, $fn=30);
            }
        }
        
        //sponge slot
        translate([-31,0,height+wall*2]) rotate([0,angle,0]) translate([0,0,-height]) minkowski(){
            hull(){
                cube([sponge_thick-wall*2, sponge_depth-wall*2, .1],center=true);
                translate([-flare/2,0,height-wall]) cube([sponge_thick-wall*2+flare, sponge_depth-wall*2, .1],center=true);
            }
            sphere(r=wall);
        }
        
        //handle slot
        translate([31,0,height+wall*2]) rotate([0,-angle,0]) translate([0,0,-height]) minkowski(){
            hull(){
                cube([handles_thick-wall*2, sponge_depth-wall*2, .1],center=true);
                translate([flare/2,0,height-wall]) cube([sponge_thick-wall*2+flare, sponge_depth-wall*2, .1],center=true);
            }
            sphere(r=wall);
        }
        
        //handle clearance
        translate([32,0,45/2*1.5+wall+23]) 
        hull(){
            rotate([0,90-angle,0]) scale([1.5,1,1]) cylinder(r=40/2,h=50);
            translate([0,0,40]) rotate([0,90-angle,0]) scale([1.5,1,1]) cylinder(r=55/2,h=50);
        }
        
        //drainage
        for(i=[0,1]) mirror([i,0,0])
        difference(){
            union(){
            translate([-bot_width-bot_w/2-wall,-depth/2+wall,-.1]) rotate([0,2,0]) 
            for(i=[0:10]){
                translate([0,i*15,0]) cube([bot_width,10,height*2]);
            }
            
            //front and back holes
            translate([-30,0,height+wall*2]) rotate([0,angle,0]) translate([0,0,-height]) minkowski(){
            hull(){
                cube([sponge_thick-wall*2, sponge_depth+wall*2, .1],center=true);
                translate([-flare/4,0,height-wall*6]) cube([sponge_thick-wall*2+flare/2, sponge_depth+wall*2, .1],center=true);
            }
            sphere(r=wall);
        }
        }
            
            //base stiffener
            translate([-bot_width/2+wall/2,0,wall/2]) cube([wall*2, depth, wall], center=true);
            //mid stiffener
            translate([-bot_width/2+wall/2,0,wall/2]) rotate([0,10,0]) translate([0,0,height/2]) cube([wall*2, depth, wall], center=true);
            //top stiffener
            translate([-bot_width/2+wall/2,0,wall/2]) rotate([0,10,0]) translate([0,0,height]) cube([wall*2, depth, wall*2], center=true);
        }
        
    }
}
